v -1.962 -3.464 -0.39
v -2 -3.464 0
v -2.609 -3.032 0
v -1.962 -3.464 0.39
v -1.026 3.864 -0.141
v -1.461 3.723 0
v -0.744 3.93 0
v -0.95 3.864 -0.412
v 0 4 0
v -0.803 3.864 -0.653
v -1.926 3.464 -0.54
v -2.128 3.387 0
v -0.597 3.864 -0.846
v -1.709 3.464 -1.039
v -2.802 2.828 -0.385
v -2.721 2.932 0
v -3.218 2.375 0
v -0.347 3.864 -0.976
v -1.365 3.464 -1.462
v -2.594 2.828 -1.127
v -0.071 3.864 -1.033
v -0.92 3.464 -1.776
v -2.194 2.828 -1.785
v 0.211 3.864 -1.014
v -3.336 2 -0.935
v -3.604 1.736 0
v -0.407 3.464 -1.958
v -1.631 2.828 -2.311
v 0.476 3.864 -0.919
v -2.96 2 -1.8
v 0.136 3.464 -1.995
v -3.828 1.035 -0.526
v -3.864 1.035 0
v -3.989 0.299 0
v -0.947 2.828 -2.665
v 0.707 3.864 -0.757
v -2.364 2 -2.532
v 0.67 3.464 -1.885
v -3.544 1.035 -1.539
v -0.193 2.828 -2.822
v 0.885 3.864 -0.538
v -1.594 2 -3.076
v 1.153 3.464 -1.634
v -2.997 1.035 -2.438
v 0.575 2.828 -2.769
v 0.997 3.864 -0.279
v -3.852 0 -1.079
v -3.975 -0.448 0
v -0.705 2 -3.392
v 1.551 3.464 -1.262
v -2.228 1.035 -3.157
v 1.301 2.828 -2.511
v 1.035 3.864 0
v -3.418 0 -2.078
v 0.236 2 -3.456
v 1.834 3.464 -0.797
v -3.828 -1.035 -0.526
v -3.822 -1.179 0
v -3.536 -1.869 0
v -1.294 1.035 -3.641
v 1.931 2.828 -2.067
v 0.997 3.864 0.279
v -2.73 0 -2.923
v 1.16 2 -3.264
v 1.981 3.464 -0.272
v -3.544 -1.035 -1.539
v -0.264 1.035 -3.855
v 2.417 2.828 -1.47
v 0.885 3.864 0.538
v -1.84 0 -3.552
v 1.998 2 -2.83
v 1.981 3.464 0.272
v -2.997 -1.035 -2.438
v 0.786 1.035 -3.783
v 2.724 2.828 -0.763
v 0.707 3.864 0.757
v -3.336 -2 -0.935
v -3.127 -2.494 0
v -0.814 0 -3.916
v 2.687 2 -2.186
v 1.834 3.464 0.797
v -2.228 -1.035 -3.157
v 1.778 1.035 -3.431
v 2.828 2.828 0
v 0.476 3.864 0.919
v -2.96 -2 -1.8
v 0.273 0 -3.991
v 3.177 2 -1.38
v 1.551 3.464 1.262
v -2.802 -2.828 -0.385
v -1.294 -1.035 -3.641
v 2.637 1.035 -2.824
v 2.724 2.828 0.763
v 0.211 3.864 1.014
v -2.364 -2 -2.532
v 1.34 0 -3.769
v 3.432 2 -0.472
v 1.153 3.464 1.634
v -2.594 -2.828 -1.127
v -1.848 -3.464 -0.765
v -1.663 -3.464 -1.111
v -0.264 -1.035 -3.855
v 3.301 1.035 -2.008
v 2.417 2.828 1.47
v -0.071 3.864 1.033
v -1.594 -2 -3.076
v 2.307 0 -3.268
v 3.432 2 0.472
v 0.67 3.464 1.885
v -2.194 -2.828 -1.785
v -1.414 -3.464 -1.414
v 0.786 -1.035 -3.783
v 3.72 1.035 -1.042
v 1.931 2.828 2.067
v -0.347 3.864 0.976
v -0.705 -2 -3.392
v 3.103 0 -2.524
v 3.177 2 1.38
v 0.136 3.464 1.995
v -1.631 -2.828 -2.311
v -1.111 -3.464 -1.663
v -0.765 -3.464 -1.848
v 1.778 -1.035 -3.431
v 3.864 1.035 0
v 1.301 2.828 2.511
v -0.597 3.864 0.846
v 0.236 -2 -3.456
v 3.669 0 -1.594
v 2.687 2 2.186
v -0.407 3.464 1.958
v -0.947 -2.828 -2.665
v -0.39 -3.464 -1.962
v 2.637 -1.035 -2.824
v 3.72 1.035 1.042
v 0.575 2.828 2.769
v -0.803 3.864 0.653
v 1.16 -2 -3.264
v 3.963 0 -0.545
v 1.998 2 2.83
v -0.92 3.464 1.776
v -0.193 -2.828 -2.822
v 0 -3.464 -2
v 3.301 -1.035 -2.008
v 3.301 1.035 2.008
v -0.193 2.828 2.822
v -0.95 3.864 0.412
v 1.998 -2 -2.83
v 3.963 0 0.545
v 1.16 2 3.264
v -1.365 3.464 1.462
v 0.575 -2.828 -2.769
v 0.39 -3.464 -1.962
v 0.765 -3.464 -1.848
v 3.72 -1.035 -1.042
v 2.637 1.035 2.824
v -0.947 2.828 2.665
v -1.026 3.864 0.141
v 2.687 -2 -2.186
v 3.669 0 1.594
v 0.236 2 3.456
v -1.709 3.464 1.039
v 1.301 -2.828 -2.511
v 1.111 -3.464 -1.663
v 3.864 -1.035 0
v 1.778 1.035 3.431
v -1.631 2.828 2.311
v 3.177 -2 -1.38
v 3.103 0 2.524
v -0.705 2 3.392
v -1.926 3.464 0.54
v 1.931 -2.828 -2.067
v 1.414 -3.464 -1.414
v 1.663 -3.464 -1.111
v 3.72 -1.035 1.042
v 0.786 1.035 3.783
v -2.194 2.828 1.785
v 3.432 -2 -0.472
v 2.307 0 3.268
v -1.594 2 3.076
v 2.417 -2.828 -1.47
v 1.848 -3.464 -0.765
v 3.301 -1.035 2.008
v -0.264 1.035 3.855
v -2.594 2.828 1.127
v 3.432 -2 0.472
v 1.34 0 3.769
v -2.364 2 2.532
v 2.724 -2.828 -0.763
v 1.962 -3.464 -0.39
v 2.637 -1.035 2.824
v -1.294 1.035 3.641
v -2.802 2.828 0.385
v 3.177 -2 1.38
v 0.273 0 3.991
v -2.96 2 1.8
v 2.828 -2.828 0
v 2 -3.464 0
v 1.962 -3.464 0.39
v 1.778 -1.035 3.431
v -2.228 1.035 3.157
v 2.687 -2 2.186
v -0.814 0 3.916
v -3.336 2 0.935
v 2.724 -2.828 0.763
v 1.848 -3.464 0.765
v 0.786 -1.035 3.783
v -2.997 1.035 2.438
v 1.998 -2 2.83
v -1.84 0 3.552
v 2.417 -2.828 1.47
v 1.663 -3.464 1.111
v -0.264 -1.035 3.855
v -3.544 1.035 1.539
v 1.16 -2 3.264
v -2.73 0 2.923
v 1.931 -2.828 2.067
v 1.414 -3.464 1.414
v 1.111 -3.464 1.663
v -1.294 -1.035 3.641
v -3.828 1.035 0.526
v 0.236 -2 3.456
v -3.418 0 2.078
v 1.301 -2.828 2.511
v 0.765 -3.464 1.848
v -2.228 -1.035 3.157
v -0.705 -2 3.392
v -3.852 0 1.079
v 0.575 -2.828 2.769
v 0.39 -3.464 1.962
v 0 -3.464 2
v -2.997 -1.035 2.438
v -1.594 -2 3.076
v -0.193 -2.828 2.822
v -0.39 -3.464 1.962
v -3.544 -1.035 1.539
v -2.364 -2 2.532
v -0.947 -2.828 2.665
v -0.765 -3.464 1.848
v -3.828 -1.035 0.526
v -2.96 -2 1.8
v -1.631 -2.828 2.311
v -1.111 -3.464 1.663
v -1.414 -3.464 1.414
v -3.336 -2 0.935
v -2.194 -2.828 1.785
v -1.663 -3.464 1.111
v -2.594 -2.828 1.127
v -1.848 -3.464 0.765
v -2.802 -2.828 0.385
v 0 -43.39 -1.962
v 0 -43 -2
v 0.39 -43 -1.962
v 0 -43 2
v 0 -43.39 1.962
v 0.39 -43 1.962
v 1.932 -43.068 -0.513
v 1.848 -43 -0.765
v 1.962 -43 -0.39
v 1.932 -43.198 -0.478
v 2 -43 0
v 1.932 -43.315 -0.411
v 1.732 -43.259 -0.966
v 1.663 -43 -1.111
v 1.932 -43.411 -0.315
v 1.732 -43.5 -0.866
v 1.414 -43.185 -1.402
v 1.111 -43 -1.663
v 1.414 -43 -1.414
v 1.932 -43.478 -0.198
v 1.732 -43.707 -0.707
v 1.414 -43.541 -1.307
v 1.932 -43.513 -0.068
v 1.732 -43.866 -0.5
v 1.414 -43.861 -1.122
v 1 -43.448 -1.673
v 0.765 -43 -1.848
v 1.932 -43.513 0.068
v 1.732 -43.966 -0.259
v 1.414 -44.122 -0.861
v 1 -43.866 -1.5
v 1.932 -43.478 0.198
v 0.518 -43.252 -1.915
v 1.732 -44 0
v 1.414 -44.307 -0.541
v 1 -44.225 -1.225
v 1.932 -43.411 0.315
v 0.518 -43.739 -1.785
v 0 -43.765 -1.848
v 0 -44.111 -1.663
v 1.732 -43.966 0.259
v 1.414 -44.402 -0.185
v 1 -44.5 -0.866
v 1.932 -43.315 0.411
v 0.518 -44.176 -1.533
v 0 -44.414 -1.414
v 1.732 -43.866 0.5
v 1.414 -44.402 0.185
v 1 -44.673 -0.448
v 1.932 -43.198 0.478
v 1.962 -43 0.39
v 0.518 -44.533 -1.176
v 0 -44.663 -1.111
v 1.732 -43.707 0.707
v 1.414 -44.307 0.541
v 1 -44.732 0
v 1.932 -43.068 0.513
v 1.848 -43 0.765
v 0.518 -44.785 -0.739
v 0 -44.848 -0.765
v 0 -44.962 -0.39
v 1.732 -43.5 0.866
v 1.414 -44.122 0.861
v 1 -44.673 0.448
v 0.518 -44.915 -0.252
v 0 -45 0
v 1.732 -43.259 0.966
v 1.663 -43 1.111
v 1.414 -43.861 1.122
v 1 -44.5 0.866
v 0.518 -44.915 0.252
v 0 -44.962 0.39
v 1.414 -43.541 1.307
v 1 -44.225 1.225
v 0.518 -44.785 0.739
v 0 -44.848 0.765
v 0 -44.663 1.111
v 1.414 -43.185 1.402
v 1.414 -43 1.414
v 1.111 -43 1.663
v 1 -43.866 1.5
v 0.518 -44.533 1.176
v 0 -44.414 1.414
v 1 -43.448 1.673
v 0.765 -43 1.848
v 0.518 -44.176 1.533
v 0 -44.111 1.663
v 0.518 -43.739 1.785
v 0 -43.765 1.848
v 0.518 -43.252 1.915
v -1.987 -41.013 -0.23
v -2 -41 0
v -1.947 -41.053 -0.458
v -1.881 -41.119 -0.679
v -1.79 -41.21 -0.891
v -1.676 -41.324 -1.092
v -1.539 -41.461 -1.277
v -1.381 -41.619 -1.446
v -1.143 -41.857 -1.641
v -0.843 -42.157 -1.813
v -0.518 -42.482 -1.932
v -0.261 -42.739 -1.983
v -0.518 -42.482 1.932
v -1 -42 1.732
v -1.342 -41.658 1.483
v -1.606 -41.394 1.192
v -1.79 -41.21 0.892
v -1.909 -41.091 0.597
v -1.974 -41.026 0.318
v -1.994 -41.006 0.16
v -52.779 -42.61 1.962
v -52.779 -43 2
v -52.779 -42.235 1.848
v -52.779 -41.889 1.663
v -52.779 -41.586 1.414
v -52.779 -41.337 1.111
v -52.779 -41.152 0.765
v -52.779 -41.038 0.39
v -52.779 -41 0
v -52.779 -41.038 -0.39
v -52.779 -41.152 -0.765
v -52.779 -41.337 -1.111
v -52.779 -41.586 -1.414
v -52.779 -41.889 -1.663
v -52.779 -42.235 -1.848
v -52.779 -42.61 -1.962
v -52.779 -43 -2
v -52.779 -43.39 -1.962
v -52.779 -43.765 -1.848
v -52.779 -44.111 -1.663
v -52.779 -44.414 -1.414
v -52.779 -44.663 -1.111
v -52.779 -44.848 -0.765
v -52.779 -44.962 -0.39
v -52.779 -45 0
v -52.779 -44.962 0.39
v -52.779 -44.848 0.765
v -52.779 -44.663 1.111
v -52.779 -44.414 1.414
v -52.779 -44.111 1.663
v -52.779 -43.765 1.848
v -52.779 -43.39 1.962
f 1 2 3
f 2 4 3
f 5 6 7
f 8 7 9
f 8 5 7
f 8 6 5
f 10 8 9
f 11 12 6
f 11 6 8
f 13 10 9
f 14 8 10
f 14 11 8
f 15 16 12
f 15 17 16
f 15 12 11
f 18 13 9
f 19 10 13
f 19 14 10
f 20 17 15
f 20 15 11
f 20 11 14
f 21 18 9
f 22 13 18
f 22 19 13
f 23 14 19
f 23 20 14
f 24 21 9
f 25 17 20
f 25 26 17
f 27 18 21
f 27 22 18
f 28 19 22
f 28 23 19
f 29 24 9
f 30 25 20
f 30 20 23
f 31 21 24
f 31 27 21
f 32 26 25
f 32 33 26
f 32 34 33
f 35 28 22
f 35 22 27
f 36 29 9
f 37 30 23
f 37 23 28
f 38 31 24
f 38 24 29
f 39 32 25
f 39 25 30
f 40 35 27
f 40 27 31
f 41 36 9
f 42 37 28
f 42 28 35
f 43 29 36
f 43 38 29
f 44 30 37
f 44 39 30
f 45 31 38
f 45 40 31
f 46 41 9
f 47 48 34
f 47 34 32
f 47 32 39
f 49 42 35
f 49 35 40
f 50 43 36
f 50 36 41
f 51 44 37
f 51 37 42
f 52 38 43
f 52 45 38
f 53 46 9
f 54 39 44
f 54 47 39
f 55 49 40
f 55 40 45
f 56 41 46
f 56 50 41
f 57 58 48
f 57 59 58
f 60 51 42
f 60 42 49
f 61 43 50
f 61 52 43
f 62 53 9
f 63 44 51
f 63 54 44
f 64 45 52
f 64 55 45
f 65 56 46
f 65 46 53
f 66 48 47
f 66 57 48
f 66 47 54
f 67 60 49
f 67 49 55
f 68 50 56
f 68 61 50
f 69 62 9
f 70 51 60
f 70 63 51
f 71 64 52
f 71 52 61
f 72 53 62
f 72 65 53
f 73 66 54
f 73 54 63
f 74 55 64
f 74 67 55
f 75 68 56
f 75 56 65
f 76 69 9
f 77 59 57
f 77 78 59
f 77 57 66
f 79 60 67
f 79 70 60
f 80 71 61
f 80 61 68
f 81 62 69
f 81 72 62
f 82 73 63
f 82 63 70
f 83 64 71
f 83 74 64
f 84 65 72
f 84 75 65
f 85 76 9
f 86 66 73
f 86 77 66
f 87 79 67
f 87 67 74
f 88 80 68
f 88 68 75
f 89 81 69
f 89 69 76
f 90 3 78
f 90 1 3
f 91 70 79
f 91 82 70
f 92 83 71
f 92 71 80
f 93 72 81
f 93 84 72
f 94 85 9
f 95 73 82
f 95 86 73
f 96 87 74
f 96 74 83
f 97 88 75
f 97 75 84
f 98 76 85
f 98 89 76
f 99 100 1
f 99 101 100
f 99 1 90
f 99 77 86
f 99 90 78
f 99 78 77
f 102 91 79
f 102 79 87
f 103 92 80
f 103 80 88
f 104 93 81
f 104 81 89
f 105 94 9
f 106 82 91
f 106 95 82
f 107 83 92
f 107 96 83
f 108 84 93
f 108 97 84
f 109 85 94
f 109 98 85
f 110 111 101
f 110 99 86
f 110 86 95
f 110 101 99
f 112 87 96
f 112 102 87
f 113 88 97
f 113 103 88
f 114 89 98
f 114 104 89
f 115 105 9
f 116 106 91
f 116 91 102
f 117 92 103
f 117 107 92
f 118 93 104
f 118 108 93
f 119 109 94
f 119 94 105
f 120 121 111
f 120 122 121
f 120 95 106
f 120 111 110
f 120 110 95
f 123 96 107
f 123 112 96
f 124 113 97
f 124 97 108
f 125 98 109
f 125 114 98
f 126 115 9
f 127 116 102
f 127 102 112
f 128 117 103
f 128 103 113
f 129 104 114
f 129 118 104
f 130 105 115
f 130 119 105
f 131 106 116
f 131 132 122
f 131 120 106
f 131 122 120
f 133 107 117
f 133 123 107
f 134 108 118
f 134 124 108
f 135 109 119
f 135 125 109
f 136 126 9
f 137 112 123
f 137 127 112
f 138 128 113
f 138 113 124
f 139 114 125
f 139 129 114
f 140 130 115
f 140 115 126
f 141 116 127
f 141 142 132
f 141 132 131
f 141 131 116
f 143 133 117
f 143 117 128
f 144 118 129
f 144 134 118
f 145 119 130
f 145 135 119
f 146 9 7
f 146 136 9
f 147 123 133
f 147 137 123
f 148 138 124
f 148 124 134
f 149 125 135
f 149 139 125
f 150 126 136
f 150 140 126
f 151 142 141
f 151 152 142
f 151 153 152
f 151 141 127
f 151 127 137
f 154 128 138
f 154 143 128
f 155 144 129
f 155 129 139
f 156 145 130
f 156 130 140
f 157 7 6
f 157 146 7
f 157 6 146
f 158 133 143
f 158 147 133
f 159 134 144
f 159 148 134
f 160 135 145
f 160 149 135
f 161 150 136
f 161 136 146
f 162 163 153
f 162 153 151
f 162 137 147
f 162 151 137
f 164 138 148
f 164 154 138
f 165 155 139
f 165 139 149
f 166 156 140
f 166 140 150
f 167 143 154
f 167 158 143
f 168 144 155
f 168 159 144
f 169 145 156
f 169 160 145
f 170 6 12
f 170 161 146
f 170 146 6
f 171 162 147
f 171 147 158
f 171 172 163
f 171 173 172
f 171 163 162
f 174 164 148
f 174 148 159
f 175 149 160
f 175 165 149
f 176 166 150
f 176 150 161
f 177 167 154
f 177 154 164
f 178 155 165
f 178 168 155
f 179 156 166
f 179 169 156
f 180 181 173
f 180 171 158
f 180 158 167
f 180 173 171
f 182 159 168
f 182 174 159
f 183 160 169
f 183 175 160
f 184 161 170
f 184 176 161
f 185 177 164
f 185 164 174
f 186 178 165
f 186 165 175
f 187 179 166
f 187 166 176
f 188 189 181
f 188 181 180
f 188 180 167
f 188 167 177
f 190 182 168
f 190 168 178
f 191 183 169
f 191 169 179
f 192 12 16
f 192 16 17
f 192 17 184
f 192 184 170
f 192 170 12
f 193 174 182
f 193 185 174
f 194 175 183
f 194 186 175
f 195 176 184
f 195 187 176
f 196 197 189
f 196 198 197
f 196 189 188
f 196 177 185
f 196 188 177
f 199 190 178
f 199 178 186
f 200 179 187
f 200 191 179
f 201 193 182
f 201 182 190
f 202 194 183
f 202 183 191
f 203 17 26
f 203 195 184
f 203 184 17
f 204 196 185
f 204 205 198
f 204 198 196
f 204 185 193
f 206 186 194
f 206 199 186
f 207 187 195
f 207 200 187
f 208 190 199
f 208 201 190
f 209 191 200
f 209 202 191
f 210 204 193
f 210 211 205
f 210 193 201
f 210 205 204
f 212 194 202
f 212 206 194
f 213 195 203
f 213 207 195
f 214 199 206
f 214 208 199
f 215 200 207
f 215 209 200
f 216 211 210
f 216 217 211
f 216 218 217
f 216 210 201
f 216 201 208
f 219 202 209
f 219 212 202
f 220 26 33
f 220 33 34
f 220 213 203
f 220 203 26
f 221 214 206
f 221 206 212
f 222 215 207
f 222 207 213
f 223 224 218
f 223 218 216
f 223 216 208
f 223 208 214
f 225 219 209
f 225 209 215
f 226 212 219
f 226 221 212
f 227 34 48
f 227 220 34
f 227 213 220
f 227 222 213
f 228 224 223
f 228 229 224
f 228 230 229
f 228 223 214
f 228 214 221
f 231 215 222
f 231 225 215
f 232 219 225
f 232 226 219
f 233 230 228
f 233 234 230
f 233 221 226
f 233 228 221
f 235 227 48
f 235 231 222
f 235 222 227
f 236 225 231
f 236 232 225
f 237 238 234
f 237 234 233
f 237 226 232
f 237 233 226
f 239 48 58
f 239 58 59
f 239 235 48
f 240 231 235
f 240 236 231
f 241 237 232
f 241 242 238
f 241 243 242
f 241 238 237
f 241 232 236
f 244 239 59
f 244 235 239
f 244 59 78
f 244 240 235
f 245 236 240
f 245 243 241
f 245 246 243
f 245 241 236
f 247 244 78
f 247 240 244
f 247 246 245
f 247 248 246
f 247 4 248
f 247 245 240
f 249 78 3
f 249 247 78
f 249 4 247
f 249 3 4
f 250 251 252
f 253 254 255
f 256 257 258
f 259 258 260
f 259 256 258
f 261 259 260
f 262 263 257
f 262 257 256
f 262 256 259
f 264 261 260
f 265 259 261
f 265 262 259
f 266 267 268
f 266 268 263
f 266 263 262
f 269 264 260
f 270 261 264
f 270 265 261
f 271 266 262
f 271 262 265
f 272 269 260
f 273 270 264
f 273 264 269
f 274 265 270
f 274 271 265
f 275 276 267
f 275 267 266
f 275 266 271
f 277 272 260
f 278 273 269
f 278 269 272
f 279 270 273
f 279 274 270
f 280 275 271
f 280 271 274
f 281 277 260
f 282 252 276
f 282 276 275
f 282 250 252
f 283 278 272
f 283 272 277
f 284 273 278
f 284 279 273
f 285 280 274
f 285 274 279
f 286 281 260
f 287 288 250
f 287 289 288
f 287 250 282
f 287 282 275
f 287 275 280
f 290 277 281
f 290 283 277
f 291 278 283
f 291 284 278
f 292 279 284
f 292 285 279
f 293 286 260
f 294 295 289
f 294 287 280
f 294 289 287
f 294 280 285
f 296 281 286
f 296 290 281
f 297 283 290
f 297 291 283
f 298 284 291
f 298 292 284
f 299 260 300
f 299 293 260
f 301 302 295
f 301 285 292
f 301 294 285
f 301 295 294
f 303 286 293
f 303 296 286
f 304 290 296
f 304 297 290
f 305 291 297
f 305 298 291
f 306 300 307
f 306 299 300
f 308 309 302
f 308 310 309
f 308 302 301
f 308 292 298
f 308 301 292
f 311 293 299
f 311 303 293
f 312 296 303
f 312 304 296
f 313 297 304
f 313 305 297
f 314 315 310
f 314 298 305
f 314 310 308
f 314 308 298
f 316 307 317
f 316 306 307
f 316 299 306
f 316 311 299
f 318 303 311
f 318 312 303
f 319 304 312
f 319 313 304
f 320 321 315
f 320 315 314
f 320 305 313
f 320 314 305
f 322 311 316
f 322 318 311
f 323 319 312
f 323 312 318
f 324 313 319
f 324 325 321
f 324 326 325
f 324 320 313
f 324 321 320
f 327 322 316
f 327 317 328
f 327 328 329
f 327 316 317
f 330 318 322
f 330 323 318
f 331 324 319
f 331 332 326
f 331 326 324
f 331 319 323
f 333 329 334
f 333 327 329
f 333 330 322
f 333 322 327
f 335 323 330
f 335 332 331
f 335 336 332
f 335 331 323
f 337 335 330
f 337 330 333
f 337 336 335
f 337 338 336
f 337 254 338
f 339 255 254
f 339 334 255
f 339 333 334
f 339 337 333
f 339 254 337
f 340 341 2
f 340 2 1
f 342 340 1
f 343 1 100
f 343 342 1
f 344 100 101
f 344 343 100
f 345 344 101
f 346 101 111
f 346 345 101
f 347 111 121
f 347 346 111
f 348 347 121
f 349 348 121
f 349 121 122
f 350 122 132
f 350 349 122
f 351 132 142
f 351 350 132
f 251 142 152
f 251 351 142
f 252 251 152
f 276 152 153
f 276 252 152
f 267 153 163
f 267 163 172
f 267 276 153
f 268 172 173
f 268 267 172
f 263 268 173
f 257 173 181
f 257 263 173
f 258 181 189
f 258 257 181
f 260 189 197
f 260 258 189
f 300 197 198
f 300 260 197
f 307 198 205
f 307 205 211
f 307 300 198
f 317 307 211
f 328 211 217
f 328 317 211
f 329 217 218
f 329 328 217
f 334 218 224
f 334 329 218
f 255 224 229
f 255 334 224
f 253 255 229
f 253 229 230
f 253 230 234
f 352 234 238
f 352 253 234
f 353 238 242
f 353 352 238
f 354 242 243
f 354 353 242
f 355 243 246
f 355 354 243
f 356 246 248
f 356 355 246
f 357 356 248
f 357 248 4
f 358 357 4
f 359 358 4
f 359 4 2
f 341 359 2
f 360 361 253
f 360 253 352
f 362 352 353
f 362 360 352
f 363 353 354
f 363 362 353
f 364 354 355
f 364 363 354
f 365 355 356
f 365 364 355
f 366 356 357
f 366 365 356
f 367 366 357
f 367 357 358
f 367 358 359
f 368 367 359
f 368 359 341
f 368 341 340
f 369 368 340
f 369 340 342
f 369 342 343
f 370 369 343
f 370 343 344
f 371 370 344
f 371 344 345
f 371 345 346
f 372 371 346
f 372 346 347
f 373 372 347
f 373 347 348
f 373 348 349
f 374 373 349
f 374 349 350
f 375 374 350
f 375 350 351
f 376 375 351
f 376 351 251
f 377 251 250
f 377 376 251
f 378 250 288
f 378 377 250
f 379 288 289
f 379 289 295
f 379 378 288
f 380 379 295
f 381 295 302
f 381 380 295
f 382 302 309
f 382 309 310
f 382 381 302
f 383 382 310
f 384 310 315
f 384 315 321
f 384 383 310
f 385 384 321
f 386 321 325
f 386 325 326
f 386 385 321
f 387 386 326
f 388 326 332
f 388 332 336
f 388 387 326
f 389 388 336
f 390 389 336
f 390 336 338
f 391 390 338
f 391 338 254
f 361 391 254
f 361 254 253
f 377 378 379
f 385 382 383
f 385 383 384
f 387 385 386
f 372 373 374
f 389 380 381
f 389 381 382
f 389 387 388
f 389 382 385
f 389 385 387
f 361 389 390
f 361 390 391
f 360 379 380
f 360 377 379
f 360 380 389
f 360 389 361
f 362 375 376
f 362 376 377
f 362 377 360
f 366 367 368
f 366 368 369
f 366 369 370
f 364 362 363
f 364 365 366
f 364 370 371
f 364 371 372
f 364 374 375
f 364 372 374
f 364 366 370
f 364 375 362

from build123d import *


with BuildPart() as part:
    # 草图1 → 旋转3 (revolve)
    with BuildSketch(Plane.XY):
        with BuildLine():
            Line((-2, 0), (0, 0))
            Line((0, 0), (0, 4))
            ThreePointArc((0, 4), (-3.863703305, 1.03527618), (-2, -3.464101615))
            Line((-2, -3.464101615), (-2, 0))
        make_face()
        with BuildLine():
            Line((0, -4), (0, 0))
            Line((0, 0), (-2, 0))
            Line((-2, 0), (-2, -3.464101615))
            ThreePointArc((-2, -3.464101615), (-1.03527618, -3.863703305), (0, -4))
        make_face()
    revolve(axis=Axis((0, -4, 0), (0, -1, 0)))

    # 草图3 → 旋转4 (revolve)
    with BuildSketch(Plane.XY):
        with BuildLine():
            Line((0, -43), (0, -2))
            ThreePointArc((0, -2), (-1.414213562, -1.414213562), (-2, 0))
            Line((-2, 0), (-2, -2))
            Line((-2, -2), (-2, -43))
            Line((-2, -43), (0, -43))
        make_face()
    revolve(axis=Axis((0, -2, 0), (0, -1, 0)))

    # 草图4 → 旋转6 (revolve)
    with BuildSketch(Plane.XZ.offset(43)):
        with BuildLine():
            Line((-52.778814048, 0), (-4, 0))
            ThreePointArc((-4, 0), (-3.863703305, 1.03527618), (-3.464101615, 2))
            Line((-3.464101615, 2), (-52.778814048, 2))
            Line((-52.778814048, 2), (-52.778814048, 0))
        make_face()
        with BuildLine():
            Line((-4, 0), (-2, 0))
            ThreePointArc((-2, 0), (-1.414213562, 1.414213562), (0, 2))
            Line((0, 2), (-0.493950763, 2))
            Line((-0.493950763, 2), (-3.464101615, 2))
            ThreePointArc((-3.464101615, 2), (-3.863703305, 1.03527618), (-4, 0))
        make_face()
        with BuildLine():
            Line((0, 2), (0, 0))
            Line((0, 0), (2, 0))
            ThreePointArc((2, 0), (1.414213562, 1.414213562), (0, 2))
        make_face()
        with BuildLine():
            Line((-2, 0), (-0.493950763, 0))
            Line((-0.493950763, 0), (0, 0))
            Line((0, 0), (0, 2))
            ThreePointArc((0, 2), (-1.414213562, 1.414213562), (-2, 0))
        make_face()
    revolve(axis=Axis((-0.493950763, -43, 0), (-1, 0, 0)))


solid = part.part
